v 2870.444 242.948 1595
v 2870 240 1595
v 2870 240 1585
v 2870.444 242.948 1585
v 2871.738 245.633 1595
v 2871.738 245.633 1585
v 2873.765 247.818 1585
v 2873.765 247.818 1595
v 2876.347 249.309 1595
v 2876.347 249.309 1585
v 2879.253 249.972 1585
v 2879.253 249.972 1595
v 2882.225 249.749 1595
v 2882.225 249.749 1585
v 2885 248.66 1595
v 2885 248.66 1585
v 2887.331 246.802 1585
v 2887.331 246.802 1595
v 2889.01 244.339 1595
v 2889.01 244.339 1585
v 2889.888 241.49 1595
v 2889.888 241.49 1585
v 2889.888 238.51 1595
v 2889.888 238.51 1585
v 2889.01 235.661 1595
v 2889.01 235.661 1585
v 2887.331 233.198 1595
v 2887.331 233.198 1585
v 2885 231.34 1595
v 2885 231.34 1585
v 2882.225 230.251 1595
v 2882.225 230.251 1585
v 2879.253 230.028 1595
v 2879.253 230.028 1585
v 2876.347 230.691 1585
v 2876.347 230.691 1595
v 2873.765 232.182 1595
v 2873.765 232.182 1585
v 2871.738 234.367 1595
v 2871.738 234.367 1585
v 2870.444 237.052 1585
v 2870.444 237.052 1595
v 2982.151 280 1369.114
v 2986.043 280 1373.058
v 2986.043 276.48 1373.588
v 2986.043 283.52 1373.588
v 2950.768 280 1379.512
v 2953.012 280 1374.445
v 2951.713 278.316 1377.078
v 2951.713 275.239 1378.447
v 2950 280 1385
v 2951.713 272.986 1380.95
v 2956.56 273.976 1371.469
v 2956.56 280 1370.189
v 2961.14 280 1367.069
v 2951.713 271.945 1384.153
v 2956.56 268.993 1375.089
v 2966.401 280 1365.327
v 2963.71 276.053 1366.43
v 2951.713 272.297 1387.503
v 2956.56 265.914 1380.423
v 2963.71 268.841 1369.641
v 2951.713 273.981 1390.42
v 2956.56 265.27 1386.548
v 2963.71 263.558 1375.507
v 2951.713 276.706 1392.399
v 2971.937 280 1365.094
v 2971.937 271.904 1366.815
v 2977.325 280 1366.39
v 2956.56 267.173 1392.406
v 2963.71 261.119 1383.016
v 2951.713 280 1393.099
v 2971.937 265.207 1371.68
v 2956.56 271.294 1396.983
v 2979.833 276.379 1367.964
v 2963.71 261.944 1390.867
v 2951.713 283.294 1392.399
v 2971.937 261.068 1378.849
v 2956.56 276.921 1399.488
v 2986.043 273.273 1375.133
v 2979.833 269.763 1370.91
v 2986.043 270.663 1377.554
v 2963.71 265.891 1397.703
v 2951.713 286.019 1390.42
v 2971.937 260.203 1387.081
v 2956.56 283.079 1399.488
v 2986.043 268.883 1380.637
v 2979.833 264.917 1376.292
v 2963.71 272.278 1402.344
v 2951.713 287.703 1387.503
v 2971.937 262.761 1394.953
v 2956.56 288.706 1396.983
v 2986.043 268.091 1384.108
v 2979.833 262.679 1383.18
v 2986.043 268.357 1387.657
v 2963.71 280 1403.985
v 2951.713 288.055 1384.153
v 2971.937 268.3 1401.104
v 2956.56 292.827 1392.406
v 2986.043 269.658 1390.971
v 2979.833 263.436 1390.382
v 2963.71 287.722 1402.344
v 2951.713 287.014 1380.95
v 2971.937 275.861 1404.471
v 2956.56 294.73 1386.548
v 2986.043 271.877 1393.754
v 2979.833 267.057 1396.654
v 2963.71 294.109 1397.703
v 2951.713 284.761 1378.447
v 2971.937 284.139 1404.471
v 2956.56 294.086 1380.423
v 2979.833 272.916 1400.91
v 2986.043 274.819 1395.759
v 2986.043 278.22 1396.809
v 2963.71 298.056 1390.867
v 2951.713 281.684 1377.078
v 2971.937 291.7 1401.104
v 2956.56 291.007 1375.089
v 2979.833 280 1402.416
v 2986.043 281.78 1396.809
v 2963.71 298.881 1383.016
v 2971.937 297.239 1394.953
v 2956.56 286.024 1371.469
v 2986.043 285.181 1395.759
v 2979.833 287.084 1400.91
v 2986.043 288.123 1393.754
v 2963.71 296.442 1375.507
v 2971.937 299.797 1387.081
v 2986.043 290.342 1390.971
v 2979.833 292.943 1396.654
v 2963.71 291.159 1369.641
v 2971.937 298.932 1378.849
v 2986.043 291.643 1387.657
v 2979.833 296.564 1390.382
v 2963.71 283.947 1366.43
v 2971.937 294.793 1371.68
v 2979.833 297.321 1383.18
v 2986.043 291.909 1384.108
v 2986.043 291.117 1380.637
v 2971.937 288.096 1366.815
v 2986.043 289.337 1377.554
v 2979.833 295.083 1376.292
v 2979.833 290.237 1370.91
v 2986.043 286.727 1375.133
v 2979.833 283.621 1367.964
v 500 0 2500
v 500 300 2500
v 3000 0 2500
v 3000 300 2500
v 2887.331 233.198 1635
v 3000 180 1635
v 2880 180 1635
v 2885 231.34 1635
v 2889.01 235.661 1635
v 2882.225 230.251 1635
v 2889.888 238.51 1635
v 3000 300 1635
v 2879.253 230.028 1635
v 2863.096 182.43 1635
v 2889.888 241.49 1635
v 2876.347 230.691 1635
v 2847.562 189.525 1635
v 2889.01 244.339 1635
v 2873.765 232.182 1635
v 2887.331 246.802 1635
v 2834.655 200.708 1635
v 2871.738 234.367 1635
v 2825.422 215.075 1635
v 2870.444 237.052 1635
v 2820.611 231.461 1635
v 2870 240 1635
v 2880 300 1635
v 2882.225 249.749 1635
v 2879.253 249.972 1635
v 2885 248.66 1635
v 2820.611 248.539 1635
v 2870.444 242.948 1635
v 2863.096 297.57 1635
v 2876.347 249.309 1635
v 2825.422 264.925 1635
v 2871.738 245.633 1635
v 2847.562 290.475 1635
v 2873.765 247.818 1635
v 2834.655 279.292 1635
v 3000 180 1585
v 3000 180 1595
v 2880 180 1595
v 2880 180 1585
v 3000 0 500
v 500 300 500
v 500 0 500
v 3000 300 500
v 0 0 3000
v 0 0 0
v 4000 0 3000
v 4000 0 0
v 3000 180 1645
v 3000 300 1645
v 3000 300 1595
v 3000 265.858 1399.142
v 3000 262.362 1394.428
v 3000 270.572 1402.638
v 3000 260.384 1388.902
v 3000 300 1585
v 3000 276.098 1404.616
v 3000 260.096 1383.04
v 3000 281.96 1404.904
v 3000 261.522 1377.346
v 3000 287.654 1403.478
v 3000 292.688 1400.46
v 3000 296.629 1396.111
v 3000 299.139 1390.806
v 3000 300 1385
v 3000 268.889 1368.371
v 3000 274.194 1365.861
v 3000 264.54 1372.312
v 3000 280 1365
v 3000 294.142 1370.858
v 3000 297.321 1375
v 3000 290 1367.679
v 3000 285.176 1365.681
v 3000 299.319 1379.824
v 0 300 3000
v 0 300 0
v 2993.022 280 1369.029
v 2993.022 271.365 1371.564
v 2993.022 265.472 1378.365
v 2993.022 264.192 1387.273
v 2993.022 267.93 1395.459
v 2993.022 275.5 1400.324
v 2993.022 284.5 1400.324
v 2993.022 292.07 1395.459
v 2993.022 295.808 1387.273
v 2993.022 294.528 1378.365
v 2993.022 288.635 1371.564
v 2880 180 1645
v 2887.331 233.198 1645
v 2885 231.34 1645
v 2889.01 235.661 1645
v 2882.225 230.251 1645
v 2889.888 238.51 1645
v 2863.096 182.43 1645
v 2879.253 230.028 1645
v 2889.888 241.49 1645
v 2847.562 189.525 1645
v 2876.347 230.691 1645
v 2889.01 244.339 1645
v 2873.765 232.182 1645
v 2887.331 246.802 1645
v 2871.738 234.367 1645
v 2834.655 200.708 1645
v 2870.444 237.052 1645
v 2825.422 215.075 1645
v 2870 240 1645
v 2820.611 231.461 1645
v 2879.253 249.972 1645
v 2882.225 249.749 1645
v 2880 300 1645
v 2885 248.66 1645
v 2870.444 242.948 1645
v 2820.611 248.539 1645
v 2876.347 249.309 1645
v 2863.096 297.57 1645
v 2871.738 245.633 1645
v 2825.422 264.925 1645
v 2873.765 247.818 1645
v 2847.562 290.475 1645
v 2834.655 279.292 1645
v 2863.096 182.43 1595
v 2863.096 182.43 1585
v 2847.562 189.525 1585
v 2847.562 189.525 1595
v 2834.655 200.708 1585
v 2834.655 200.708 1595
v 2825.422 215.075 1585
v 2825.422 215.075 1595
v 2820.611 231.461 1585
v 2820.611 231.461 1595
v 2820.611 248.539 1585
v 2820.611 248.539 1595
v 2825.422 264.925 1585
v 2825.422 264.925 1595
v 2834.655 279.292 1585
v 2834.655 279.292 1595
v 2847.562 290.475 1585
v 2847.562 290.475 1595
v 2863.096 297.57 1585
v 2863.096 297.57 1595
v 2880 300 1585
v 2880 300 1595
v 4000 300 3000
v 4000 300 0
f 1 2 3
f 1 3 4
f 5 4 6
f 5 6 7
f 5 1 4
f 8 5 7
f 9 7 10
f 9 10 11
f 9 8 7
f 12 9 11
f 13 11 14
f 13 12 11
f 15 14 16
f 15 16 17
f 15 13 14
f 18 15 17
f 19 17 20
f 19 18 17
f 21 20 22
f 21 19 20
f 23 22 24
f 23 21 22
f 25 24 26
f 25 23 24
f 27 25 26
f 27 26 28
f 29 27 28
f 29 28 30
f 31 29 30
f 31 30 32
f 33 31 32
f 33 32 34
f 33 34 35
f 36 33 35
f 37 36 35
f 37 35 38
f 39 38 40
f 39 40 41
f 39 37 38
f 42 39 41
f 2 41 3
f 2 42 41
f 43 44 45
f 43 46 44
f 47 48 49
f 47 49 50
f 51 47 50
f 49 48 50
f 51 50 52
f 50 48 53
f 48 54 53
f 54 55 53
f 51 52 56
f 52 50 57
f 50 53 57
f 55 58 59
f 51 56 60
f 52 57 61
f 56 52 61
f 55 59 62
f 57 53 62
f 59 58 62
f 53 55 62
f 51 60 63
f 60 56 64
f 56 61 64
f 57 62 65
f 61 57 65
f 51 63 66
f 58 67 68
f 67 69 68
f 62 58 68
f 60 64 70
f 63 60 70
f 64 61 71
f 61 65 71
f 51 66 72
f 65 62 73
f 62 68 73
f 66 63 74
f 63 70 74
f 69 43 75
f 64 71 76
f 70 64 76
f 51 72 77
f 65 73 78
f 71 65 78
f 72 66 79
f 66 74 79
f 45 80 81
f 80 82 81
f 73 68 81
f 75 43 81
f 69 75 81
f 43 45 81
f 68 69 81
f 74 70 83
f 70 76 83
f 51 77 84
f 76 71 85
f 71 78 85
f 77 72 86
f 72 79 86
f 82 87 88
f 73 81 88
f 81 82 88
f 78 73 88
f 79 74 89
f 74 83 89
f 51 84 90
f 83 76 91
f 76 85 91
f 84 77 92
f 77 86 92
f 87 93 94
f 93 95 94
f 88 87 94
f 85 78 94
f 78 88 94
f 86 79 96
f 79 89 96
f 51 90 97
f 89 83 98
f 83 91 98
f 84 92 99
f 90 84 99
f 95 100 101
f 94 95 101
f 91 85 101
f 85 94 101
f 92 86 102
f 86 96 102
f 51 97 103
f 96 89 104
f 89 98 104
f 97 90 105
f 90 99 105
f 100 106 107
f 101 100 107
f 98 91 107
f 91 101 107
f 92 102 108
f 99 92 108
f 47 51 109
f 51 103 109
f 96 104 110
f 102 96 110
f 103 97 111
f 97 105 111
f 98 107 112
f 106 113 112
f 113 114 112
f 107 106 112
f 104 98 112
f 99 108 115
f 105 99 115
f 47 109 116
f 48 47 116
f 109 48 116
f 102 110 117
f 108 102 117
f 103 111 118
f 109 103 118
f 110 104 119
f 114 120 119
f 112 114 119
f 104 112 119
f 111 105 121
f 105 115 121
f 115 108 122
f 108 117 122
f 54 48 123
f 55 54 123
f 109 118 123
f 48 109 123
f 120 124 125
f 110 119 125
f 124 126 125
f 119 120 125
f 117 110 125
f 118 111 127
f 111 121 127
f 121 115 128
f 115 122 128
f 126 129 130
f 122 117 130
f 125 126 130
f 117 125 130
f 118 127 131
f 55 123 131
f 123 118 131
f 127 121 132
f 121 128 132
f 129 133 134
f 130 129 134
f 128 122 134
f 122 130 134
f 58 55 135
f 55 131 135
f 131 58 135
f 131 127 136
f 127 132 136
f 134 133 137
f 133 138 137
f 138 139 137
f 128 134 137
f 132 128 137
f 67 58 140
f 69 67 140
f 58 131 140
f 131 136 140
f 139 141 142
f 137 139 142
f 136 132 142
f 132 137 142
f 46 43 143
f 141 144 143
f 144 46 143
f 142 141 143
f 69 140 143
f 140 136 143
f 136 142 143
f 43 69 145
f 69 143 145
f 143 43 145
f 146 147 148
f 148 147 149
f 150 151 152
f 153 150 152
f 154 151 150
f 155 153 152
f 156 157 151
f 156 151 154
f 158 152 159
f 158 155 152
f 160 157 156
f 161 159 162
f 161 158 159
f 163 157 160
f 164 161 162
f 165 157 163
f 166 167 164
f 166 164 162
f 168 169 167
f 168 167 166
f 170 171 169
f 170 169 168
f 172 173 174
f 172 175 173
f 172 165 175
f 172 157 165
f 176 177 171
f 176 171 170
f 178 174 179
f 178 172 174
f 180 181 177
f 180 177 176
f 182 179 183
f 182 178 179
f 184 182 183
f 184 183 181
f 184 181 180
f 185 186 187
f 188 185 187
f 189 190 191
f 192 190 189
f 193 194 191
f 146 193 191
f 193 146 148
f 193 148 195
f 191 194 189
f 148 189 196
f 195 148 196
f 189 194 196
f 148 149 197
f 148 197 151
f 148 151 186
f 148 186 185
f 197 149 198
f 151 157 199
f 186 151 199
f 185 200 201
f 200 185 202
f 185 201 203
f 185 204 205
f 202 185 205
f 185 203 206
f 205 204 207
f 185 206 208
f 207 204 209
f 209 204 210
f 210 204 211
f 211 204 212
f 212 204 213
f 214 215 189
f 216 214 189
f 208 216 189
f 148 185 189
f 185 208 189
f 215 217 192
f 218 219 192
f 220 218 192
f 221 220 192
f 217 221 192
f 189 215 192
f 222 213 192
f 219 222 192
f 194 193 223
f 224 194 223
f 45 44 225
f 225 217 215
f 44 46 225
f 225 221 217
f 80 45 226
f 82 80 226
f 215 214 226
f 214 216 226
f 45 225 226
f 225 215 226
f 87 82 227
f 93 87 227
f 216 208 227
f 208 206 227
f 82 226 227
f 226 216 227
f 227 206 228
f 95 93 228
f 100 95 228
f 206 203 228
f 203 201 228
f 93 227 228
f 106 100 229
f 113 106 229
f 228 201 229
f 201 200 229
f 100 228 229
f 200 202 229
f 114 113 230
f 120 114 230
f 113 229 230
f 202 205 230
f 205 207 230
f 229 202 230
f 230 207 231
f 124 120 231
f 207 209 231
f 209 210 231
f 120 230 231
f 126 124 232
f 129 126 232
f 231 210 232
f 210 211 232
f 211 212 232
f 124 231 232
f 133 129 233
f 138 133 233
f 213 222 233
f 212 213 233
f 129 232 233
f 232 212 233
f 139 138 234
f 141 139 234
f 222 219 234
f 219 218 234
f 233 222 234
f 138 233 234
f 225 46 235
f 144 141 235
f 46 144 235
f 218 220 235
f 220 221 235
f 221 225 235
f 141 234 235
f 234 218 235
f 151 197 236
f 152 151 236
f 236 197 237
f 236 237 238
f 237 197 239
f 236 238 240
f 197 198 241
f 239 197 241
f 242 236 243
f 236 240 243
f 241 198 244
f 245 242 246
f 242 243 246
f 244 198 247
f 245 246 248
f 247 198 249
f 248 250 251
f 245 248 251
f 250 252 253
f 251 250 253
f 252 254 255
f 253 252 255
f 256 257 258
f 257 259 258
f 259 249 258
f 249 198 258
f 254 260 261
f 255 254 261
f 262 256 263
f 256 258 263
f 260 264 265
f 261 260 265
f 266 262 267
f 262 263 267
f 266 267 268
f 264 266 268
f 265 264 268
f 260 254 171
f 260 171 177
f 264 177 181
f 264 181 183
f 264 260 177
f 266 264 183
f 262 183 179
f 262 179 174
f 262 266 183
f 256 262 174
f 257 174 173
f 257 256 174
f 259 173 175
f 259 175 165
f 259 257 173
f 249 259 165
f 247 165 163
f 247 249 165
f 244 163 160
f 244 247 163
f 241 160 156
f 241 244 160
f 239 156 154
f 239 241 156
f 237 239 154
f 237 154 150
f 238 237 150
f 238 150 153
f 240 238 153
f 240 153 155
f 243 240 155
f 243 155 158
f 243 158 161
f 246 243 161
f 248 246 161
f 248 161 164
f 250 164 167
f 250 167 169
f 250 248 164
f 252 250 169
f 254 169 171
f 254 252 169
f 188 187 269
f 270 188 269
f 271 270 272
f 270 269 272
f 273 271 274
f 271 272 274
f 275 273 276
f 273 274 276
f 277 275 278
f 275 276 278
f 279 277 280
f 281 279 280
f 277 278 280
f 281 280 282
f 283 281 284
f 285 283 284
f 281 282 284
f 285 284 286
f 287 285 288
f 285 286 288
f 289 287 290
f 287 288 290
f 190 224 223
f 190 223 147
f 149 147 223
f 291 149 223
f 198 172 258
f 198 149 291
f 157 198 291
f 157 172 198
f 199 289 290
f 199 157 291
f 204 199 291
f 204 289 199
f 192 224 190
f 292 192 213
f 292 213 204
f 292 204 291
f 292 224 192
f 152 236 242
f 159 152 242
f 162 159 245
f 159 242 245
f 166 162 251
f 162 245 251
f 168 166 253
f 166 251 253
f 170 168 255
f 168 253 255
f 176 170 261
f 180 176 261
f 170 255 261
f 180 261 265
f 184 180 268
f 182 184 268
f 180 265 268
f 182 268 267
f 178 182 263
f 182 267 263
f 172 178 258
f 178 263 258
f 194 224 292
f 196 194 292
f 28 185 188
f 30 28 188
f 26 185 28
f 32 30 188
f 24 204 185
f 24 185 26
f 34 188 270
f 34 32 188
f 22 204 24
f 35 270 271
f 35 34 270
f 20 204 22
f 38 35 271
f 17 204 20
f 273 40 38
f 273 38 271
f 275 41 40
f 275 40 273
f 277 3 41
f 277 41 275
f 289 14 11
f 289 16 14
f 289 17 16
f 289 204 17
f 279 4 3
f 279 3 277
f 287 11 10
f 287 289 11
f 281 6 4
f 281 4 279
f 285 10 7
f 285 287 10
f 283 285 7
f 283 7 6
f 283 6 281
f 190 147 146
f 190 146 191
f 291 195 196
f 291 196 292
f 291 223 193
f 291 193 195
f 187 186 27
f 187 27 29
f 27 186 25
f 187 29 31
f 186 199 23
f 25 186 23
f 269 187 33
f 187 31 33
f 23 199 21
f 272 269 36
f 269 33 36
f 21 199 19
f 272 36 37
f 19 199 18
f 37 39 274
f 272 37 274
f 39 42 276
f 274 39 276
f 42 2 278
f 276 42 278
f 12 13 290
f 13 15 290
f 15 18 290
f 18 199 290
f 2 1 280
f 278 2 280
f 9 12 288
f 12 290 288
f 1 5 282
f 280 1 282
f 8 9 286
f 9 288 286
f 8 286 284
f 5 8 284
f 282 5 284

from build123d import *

# Parameters (mm, degrees)
SKETCH1_W           = 4000
SKETCH1_H           = 300
BOSS_EXTRUDE1_DEPTH = 3000
SKETCH3_W           = 2500
SKETCH3_H           = 2000
CUT_EXTRUDE1_DEPTH  = 3000
SKETCH6_R           = 10
BOSS_EXTRUDE2_DEPTH = 10
SKETCH7_R           = 10
BOSS_EXTRUDE3_DEPTH = 10


with BuildPart() as part:
    # Sketch1 → Boss-Extrude1 (new body)
    with BuildSketch(Plane.XY):
        with Locations((2000, 150)):
            Rectangle(SKETCH1_W, SKETCH1_H)
    extrude(amount=BOSS_EXTRUDE1_DEPTH)

    # Sketch3 → Cut-Extrude1 (cut)
    with BuildSketch(Plane(origin=(0, 300, 0), x_dir=(1, 0, 0), z_dir=(0, 1, 0))):
        with Locations((1750, -1500)):
            Rectangle(SKETCH3_W, SKETCH3_H)
    extrude(amount=-CUT_EXTRUDE1_DEPTH, mode=Mode.SUBTRACT)

    # Sketch6 → Boss-Extrude2 (add)
    with BuildSketch(Plane(origin=(0, 0, 1645), x_dir=(-1, 0, 0), z_dir=(0, 0, -1))):
        with BuildLine():
            Line((-3000, 300), (-3000, 180))
            Line((-3000, 180), (-2880, 180))
            ThreePointArc((-2880, 180), (-2820, 240), (-2880, 300))
            Line((-2880, 300), (-3000, 300))
        make_face()
        with Locations((-2880, 240)):
            Circle(SKETCH6_R, mode=Mode.SUBTRACT)
    extrude(amount=BOSS_EXTRUDE2_DEPTH)

    # Sketch7 → Boss-Extrude3 (add)
    with BuildSketch(Plane(origin=(0, 0, 1595), x_dir=(-1, 0, 0), z_dir=(0, 0, -1))):
        with BuildLine():
            Line((-3000, 300), (-3000, 180))
            Line((-3000, 180), (-2880, 180))
            ThreePointArc((-2880, 180), (-2820, 240), (-2880, 300))
            Line((-2880, 300), (-3000, 300))
        make_face()
        with Locations((-2880, 240)):
            Circle(SKETCH7_R, mode=Mode.SUBTRACT)
    extrude(amount=BOSS_EXTRUDE3_DEPTH)

    # Sketch8 → Revolve1 (revolve)
    with BuildSketch(Plane(origin=(0, 0, 1385), x_dir=(-1, 0, 0), z_dir=(0, 0, -1)), mode=Mode.PRIVATE) as revolve1_sk:
        with BuildLine():
            Line((-3000, 300), (-3000, 280))
            Line((-3000, 280), (-2950, 280))
            ThreePointArc((-2950, 280), (-2963.709750078, 298.985066655), (-2986.043275591, 291.942081406))
            Line((-2986.043275591, 291.942081406), (-3000, 300))
        make_face()
    revolve(revolve1_sk.sketch.rotate(Axis((3000, 280, 1385), (-1, 0, 0)), 90), axis=Axis((3000, 280, 1385), (-1, 0, 0)))


solid = part.part
